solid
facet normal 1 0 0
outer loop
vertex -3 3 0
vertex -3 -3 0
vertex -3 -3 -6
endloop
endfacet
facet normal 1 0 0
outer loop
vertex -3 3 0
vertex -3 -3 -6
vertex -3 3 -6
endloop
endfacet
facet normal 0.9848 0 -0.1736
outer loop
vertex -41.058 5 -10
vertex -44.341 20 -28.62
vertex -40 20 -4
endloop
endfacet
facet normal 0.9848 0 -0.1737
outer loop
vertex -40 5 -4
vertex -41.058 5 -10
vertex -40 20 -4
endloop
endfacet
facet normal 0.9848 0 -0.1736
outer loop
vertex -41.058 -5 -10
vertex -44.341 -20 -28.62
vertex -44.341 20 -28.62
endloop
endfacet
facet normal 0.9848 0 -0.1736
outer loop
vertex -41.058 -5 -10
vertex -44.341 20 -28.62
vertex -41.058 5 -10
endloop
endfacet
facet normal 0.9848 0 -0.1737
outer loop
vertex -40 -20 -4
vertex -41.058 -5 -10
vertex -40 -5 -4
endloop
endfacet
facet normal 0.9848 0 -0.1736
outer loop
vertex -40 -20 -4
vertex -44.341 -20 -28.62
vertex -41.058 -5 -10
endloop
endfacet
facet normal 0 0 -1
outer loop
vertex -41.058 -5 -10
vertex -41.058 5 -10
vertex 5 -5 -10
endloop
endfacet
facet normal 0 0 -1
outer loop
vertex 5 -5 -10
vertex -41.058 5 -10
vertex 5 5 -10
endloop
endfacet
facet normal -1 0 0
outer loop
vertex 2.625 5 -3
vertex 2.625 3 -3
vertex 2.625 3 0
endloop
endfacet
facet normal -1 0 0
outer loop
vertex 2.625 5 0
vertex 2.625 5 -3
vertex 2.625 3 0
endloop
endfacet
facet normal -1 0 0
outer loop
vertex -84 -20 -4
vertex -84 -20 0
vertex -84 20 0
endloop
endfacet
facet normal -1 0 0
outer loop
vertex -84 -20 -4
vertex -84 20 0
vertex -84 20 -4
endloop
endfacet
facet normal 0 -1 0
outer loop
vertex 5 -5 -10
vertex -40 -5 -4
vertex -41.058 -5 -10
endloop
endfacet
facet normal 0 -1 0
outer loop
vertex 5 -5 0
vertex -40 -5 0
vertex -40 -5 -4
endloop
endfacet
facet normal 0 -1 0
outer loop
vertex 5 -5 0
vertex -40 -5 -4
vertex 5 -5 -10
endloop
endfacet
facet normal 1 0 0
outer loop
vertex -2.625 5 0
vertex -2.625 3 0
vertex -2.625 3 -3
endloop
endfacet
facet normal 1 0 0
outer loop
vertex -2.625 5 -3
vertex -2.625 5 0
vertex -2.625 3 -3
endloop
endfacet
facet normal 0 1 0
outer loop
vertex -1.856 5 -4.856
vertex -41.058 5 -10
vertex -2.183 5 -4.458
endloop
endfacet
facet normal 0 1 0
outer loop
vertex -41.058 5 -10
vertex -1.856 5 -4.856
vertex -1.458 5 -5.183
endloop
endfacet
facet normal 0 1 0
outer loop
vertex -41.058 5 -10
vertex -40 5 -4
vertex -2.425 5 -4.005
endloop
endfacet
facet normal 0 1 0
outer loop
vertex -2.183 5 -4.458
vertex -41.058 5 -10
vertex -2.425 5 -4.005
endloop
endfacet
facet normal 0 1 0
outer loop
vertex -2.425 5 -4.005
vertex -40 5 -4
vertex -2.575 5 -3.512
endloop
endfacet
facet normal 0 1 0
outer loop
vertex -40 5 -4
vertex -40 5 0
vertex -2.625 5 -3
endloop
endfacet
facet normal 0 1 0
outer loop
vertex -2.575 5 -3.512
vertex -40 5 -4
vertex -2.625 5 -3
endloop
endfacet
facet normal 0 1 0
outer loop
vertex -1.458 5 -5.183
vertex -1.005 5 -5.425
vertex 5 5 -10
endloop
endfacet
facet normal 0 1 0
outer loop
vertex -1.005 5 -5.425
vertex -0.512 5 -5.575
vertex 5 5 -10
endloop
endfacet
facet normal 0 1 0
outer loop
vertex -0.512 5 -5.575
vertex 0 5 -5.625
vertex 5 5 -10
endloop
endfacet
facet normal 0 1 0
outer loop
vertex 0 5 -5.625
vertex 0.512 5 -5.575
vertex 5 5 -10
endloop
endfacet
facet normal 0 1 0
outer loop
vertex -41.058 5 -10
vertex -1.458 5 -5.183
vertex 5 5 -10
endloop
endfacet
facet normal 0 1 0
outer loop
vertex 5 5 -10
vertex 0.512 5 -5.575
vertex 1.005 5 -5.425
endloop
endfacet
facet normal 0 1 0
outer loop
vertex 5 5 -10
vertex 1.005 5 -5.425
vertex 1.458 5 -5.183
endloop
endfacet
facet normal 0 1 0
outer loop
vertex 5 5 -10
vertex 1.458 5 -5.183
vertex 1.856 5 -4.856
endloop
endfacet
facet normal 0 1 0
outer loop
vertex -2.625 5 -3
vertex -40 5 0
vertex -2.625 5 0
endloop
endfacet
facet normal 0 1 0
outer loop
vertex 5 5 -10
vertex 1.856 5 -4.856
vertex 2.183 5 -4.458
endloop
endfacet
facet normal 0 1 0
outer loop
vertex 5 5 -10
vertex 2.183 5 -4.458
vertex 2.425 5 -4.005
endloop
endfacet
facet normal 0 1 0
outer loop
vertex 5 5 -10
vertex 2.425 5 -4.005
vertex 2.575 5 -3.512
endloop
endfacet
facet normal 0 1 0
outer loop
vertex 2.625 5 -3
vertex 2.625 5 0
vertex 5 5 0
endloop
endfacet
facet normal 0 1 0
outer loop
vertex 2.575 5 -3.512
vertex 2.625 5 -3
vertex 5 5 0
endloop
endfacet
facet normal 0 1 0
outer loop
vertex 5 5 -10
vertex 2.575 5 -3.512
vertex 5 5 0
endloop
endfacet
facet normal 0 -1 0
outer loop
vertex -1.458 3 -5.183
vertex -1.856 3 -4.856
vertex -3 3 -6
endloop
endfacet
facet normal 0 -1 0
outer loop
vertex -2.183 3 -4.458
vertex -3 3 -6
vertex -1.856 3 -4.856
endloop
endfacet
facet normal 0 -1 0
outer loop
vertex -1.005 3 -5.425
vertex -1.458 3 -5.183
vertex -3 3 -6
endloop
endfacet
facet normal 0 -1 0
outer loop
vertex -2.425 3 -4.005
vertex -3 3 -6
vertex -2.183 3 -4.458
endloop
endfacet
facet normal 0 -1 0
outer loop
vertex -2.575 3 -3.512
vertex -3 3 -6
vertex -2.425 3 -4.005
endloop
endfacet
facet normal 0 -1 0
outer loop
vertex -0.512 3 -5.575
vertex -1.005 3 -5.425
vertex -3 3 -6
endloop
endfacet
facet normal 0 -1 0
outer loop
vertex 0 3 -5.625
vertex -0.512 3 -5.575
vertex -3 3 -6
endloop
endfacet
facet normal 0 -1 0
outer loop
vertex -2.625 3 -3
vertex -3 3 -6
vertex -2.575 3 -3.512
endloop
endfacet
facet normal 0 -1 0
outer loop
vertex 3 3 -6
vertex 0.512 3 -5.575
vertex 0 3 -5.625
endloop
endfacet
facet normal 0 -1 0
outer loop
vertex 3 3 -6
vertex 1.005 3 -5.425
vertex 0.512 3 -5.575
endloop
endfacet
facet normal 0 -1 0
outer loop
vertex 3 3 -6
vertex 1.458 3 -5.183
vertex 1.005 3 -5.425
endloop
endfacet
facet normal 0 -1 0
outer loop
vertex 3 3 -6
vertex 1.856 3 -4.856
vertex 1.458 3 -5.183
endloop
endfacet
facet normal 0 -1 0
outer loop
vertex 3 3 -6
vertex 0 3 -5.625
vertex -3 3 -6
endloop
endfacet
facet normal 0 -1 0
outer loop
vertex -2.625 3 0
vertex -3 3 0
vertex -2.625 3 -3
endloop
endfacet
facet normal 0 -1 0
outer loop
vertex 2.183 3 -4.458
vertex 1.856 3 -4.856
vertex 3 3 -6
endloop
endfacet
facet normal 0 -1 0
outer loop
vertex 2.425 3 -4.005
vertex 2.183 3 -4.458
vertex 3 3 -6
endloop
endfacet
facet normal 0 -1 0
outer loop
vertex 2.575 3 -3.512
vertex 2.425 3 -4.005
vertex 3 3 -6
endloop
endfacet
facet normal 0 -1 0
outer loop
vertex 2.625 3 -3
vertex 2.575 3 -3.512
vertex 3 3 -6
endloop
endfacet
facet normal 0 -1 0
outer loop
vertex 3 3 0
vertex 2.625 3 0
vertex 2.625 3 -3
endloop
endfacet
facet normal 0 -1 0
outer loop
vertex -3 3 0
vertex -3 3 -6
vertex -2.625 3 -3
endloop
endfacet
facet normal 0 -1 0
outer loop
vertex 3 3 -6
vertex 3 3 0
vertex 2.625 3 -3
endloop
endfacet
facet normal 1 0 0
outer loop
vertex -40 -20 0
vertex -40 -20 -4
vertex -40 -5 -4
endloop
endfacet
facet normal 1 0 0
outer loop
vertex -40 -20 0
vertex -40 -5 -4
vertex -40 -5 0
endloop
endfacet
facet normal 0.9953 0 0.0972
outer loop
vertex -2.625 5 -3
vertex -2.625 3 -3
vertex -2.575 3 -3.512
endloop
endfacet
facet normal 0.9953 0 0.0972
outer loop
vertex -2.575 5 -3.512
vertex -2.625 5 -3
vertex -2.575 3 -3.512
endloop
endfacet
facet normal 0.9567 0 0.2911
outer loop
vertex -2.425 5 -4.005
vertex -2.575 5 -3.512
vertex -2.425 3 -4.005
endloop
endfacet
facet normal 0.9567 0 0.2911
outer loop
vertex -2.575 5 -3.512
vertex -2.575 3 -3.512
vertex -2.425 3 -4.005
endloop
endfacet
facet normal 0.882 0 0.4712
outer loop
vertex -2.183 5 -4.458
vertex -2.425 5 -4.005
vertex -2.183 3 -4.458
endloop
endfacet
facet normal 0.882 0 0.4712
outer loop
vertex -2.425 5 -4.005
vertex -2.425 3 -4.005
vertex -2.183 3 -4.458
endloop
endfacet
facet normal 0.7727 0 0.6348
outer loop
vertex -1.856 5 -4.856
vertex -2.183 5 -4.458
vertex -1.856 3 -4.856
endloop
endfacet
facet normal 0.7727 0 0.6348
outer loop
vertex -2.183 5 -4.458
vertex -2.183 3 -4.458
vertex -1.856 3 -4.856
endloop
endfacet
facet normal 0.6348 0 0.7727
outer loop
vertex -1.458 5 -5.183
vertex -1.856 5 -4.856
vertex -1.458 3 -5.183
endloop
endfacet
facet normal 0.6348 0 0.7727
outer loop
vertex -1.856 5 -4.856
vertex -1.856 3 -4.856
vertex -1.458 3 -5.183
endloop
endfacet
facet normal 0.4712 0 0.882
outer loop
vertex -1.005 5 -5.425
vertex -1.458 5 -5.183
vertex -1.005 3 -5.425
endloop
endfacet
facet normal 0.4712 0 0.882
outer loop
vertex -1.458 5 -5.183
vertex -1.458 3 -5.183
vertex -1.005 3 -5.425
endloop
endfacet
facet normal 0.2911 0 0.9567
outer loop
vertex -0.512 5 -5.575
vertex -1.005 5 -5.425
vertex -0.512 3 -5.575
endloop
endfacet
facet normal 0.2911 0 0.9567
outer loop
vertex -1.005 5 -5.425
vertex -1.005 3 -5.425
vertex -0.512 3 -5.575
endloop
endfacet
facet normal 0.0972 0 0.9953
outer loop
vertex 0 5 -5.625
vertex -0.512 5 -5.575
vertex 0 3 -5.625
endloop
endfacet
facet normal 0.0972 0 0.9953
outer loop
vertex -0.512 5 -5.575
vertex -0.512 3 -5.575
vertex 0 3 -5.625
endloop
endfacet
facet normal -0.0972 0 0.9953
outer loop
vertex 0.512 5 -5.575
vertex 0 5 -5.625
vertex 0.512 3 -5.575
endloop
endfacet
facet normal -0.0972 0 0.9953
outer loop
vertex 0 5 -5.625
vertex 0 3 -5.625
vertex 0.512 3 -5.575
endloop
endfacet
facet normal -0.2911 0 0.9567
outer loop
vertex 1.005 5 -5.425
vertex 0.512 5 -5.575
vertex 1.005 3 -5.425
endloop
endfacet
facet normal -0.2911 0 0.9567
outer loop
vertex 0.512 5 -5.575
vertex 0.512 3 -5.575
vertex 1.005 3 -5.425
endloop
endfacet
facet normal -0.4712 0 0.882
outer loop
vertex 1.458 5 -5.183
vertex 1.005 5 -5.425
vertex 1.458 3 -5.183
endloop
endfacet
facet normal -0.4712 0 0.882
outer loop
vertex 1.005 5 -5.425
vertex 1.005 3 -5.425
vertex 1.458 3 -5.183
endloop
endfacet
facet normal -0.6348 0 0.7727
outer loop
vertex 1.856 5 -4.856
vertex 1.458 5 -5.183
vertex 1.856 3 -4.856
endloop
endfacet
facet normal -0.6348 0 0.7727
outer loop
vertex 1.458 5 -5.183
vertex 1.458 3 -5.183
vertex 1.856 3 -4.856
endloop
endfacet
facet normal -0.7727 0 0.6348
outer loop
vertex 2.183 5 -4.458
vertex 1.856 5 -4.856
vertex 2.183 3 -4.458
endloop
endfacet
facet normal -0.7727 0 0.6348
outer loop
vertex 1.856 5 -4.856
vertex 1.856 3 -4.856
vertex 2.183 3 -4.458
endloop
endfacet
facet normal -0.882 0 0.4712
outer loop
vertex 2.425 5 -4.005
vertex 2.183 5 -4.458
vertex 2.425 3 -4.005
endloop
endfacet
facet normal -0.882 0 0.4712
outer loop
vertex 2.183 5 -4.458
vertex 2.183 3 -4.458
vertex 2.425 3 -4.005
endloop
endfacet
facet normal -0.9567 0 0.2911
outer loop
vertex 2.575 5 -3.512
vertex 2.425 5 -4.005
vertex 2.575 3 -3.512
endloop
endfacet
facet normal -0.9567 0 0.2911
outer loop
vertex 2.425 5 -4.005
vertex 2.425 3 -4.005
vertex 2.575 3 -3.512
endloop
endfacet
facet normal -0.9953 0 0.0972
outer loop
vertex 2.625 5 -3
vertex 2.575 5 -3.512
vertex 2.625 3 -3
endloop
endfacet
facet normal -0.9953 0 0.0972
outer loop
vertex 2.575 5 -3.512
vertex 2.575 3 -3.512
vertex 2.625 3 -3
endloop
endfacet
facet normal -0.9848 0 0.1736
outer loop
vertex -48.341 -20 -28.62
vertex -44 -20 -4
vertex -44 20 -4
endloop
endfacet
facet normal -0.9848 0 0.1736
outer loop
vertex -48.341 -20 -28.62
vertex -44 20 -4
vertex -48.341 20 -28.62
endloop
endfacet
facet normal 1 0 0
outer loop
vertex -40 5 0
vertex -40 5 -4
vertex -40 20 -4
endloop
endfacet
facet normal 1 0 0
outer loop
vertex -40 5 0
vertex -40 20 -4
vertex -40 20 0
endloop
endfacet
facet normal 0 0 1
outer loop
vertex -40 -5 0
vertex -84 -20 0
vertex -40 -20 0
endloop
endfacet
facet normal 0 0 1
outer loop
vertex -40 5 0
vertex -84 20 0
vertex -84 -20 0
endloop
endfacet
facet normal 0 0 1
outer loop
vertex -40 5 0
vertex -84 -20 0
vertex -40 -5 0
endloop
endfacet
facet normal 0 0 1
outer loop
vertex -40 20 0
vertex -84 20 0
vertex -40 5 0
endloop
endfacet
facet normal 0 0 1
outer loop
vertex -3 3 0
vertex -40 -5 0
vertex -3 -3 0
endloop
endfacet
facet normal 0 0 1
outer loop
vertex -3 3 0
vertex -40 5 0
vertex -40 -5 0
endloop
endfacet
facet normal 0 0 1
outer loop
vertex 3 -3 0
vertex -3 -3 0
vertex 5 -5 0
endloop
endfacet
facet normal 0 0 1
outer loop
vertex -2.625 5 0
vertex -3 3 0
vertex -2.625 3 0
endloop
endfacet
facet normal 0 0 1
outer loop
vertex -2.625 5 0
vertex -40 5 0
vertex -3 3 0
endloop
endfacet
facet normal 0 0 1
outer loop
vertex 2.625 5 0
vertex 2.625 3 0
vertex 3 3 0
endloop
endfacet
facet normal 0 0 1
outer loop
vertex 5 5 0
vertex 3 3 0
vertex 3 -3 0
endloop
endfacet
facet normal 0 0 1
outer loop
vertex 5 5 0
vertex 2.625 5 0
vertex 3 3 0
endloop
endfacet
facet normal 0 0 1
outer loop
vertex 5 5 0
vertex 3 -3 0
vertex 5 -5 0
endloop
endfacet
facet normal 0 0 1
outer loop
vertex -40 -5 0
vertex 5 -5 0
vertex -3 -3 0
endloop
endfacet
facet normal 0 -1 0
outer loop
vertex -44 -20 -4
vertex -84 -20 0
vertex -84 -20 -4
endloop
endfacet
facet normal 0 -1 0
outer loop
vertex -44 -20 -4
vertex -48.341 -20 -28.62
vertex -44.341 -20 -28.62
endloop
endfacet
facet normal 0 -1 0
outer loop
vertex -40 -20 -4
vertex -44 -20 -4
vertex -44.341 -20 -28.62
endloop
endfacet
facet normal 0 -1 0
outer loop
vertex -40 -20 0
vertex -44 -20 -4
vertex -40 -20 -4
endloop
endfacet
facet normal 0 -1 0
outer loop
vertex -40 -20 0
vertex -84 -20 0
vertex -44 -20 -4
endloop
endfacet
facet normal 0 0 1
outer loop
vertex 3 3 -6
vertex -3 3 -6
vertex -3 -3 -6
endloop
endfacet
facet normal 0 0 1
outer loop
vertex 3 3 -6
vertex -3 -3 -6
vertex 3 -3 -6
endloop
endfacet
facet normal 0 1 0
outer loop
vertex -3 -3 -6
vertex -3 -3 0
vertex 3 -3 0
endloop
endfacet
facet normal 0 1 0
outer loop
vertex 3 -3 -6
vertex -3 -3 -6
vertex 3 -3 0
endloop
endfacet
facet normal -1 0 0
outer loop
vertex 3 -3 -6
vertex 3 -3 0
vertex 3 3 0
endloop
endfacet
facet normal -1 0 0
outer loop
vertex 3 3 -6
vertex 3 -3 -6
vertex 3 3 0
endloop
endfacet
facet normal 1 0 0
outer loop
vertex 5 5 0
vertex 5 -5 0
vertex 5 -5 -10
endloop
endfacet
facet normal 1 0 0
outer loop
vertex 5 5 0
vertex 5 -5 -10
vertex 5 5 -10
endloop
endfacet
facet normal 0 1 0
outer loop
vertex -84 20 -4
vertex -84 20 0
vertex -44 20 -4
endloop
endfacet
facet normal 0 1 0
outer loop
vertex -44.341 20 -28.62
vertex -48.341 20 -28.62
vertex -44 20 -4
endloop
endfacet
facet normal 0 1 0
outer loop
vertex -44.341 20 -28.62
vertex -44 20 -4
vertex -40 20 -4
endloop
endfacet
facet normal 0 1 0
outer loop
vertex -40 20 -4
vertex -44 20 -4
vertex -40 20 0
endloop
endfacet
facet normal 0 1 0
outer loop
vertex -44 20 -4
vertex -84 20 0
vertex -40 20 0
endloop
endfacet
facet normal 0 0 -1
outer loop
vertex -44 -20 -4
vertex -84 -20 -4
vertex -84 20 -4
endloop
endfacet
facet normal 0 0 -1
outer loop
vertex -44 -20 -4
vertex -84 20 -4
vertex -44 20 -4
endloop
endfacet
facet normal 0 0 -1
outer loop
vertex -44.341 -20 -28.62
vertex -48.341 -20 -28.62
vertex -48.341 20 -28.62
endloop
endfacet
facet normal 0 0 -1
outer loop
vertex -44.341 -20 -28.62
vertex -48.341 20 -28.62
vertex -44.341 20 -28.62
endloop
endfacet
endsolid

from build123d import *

# Parameters (mm, degrees)
PAD001_DEPTH    = 20
SKETCH004_W     = 39
SKETCH004_H     = 10
PAD_DEPTH       = 10
SKETCH_W        = 10
SKETCH_H        = 10
PAD002_DEPTH    = 10
SKETCH001_W     = 6
SKETCH001_H     = 6
POCKET_DEPTH    = 6
POCKET001_DEPTH = 17.001


with BuildPart() as part:
    # Sketch003 → Pad001 (new body, symmetric)
    with BuildSketch(Plane(origin=(-40, 0, 0), x_dir=(1, 0, 0), z_dir=(0, -1, 0))):
        Polygon((0, 0), (-44, 0), (-44, -4), (-4, -4), (-8.341204, -28.620194), (-4.341204, -28.620194), (0, -4), align=None)
    extrude(amount=PAD001_DEPTH, both=True)

    # Sketch004 → Pad (join)
    with BuildSketch(Plane.XY):
        with Locations((-24.5, 0)):
            Rectangle(SKETCH004_W, SKETCH004_H)
    extrude(amount=-PAD_DEPTH)

    # Sketch → Pad002 (join)
    with BuildSketch(Plane.XY):
        Rectangle(SKETCH_W, SKETCH_H)
    extrude(amount=-PAD002_DEPTH)

    # Sketch001 → Pocket (cut)
    with BuildSketch(Plane.XY):
        Rectangle(SKETCH001_W, SKETCH001_H)
    extrude(amount=-POCKET_DEPTH, mode=Mode.SUBTRACT)

    # Sketch002 → Pocket001 (cut, through all)
    with BuildSketch(Plane.XZ.offset(-3)):
        with BuildLine():
            ThreePointArc((-2.625, -3), (0, -5.625), (2.625, -3))
            Line((2.625, -3), (2.625, 6))
            ThreePointArc((2.625, 6), (0, 8.625), (-2.625, 6))
            Line((-2.625, 6), (-2.625, -3))
        make_face()
    extrude(amount=-POCKET001_DEPTH, mode=Mode.SUBTRACT)


solid = part.part
